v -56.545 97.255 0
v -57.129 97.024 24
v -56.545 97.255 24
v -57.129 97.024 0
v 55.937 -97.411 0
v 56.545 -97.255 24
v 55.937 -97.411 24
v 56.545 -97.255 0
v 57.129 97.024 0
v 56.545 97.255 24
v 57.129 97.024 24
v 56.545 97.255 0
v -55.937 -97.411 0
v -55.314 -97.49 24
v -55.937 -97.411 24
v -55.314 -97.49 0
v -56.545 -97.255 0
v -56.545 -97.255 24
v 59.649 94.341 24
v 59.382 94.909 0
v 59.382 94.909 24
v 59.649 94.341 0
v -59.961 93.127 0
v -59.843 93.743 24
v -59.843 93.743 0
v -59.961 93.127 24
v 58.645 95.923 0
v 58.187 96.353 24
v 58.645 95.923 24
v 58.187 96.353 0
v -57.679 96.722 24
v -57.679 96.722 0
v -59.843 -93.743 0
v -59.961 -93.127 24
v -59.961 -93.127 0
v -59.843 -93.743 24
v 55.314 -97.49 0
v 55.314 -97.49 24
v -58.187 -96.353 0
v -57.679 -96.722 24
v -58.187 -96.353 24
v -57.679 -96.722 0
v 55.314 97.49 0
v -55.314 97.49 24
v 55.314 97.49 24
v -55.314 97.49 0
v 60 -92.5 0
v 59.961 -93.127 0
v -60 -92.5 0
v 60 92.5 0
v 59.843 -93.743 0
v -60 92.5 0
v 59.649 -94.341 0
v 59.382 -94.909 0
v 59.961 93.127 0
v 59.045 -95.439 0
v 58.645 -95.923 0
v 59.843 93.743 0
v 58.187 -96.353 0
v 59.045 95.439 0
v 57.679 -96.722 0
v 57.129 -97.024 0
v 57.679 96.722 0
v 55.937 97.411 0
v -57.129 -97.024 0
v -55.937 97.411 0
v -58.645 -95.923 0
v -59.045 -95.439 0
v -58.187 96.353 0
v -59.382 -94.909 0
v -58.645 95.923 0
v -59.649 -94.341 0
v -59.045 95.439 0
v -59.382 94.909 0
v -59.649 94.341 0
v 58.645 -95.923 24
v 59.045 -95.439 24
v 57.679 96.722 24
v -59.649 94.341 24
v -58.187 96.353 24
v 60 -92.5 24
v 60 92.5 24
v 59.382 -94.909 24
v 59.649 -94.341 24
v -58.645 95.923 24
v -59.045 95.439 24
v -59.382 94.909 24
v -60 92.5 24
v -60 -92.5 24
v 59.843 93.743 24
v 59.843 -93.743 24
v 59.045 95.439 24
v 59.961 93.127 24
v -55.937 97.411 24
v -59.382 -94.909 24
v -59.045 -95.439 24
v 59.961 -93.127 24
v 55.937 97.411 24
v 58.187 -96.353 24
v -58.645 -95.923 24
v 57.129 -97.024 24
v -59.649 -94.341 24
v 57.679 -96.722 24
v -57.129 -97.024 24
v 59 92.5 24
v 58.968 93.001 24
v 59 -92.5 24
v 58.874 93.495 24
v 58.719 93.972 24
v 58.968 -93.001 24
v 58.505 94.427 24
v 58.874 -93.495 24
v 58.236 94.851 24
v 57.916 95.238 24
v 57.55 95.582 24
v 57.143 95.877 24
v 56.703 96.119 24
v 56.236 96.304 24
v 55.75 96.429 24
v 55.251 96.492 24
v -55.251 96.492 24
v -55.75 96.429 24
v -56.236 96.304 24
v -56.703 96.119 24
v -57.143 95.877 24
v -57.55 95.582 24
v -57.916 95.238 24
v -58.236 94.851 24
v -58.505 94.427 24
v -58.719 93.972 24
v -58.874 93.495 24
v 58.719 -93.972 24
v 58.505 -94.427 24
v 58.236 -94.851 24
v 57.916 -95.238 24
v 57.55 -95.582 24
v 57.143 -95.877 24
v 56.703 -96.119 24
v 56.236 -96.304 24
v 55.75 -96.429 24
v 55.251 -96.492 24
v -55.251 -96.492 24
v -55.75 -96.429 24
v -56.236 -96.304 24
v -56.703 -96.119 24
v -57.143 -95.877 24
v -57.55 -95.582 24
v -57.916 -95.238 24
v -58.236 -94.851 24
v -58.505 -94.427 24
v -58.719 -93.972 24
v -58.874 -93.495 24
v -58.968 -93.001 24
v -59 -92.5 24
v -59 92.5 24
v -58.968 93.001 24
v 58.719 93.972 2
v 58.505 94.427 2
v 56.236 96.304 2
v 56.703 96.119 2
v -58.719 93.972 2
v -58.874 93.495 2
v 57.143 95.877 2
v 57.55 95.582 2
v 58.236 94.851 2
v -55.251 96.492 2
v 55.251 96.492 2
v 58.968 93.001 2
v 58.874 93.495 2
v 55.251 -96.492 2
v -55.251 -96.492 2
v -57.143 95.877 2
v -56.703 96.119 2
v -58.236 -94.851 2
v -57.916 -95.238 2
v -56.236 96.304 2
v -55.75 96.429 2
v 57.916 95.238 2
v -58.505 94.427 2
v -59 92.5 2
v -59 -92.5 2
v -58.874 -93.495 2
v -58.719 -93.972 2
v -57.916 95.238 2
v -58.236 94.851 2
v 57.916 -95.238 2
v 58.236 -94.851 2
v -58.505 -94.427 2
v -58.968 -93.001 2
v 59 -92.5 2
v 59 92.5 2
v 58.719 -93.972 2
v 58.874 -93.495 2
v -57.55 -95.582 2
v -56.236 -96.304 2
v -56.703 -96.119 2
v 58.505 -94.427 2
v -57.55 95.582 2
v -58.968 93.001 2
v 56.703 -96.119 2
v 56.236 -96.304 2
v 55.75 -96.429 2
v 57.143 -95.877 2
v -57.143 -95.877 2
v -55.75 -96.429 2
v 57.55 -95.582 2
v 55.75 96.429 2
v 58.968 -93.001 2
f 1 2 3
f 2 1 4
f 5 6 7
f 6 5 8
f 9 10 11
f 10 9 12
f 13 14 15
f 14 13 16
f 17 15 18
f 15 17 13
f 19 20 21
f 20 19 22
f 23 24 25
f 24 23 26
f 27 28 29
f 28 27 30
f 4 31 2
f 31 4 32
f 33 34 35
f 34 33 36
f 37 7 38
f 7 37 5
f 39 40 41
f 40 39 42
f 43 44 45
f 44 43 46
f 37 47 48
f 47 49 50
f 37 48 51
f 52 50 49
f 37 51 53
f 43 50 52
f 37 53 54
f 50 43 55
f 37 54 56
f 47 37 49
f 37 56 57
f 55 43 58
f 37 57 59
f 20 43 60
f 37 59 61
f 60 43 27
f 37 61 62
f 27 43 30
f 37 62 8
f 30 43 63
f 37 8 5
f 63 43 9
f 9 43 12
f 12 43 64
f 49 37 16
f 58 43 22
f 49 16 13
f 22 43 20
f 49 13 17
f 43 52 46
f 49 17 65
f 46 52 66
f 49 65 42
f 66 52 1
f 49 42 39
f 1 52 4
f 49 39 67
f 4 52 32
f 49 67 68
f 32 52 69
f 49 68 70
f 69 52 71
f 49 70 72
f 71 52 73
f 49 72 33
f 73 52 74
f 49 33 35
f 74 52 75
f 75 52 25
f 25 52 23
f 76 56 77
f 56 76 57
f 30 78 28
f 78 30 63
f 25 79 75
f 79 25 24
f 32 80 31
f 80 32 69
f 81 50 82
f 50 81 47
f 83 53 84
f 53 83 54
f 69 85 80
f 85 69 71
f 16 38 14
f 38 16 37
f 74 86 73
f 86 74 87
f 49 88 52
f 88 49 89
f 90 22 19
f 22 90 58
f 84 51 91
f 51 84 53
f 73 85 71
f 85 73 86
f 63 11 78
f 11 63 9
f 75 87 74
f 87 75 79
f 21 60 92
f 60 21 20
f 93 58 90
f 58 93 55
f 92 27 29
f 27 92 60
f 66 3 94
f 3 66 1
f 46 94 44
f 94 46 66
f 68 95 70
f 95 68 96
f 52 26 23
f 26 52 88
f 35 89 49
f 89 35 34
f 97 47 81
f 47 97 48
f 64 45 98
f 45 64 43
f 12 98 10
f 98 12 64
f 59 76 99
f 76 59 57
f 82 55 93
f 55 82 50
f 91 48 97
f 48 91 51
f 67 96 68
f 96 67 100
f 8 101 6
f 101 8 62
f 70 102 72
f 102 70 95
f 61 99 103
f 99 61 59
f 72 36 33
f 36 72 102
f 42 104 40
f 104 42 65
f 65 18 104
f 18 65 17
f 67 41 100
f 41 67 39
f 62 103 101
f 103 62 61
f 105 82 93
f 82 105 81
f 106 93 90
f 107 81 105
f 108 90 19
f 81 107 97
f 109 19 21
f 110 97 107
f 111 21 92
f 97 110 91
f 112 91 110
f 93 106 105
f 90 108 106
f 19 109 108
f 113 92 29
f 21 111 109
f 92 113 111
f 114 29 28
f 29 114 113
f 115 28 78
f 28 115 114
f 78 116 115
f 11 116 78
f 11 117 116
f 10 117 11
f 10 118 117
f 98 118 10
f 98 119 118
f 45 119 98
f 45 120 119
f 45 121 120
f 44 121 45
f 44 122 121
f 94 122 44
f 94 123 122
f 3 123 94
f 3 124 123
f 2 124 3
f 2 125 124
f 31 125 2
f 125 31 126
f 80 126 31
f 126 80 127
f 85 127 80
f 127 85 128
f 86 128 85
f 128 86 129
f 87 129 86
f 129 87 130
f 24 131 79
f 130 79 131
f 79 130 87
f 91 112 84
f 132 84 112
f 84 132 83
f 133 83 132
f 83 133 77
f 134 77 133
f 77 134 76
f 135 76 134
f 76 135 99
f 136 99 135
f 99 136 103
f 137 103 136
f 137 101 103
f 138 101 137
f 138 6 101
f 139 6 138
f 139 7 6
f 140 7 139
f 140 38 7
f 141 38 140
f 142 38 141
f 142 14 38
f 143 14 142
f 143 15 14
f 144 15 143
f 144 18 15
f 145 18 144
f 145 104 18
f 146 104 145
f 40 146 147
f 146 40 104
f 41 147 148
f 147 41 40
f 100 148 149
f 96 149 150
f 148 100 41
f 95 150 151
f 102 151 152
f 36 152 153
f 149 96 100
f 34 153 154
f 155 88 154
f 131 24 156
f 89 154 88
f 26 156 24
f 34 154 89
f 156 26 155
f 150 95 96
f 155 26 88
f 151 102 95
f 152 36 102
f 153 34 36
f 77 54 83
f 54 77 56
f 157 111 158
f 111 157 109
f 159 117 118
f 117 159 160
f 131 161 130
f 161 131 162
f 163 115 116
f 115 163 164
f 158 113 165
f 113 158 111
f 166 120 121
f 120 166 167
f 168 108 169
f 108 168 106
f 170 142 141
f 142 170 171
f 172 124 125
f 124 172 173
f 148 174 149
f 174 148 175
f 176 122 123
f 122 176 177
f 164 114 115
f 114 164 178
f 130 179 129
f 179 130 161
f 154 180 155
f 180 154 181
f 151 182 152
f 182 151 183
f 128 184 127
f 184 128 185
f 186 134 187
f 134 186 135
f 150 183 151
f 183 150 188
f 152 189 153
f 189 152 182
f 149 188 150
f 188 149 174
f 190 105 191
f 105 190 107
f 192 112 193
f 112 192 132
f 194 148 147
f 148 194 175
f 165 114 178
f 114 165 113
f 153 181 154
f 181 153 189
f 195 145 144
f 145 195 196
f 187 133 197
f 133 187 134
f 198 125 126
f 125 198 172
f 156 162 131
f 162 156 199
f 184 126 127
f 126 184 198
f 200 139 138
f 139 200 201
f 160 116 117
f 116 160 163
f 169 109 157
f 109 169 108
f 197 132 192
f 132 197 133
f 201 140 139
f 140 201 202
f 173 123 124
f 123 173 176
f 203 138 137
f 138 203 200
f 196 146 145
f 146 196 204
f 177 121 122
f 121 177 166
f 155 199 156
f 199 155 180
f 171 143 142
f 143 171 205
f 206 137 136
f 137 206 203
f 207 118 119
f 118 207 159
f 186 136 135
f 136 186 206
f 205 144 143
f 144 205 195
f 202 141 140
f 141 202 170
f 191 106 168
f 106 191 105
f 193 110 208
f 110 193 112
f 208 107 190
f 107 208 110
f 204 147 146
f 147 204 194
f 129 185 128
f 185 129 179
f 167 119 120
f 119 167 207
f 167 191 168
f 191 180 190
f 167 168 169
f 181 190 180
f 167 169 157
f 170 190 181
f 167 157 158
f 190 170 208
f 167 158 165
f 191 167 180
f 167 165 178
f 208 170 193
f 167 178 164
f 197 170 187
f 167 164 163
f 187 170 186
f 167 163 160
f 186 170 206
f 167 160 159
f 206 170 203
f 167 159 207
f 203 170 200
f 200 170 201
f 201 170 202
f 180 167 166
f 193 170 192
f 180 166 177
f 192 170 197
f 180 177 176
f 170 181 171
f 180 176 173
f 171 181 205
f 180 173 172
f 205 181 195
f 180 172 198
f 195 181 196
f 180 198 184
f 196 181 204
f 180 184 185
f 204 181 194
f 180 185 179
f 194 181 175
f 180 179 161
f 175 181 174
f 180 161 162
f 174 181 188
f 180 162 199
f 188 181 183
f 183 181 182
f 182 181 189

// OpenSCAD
$fn = 50;


difference() {
	union() {
		hull() {
			translate(v = [-55.0000000000, 92.5000000000, 0]) {
				cylinder(h = 24, r = 5);
			}
			translate(v = [55.0000000000, 92.5000000000, 0]) {
				cylinder(h = 24, r = 5);
			}
			translate(v = [-55.0000000000, -92.5000000000, 0]) {
				cylinder(h = 24, r = 5);
			}
			translate(v = [55.0000000000, -92.5000000000, 0]) {
				cylinder(h = 24, r = 5);
			}
		}
	}
	union() {
		translate(v = [0, 0, 2]) {
			hull() {
				translate(v = [-55.0000000000, 92.5000000000, 0]) {
					cylinder(h = 22, r = 4);
				}
				translate(v = [55.0000000000, 92.5000000000, 0]) {
					cylinder(h = 22, r = 4);
				}
				translate(v = [-55.0000000000, -92.5000000000, 0]) {
					cylinder(h = 22, r = 4);
				}
				translate(v = [55.0000000000, -92.5000000000, 0]) {
					cylinder(h = 22, r = 4);
				}
			}
		}
	}
}
